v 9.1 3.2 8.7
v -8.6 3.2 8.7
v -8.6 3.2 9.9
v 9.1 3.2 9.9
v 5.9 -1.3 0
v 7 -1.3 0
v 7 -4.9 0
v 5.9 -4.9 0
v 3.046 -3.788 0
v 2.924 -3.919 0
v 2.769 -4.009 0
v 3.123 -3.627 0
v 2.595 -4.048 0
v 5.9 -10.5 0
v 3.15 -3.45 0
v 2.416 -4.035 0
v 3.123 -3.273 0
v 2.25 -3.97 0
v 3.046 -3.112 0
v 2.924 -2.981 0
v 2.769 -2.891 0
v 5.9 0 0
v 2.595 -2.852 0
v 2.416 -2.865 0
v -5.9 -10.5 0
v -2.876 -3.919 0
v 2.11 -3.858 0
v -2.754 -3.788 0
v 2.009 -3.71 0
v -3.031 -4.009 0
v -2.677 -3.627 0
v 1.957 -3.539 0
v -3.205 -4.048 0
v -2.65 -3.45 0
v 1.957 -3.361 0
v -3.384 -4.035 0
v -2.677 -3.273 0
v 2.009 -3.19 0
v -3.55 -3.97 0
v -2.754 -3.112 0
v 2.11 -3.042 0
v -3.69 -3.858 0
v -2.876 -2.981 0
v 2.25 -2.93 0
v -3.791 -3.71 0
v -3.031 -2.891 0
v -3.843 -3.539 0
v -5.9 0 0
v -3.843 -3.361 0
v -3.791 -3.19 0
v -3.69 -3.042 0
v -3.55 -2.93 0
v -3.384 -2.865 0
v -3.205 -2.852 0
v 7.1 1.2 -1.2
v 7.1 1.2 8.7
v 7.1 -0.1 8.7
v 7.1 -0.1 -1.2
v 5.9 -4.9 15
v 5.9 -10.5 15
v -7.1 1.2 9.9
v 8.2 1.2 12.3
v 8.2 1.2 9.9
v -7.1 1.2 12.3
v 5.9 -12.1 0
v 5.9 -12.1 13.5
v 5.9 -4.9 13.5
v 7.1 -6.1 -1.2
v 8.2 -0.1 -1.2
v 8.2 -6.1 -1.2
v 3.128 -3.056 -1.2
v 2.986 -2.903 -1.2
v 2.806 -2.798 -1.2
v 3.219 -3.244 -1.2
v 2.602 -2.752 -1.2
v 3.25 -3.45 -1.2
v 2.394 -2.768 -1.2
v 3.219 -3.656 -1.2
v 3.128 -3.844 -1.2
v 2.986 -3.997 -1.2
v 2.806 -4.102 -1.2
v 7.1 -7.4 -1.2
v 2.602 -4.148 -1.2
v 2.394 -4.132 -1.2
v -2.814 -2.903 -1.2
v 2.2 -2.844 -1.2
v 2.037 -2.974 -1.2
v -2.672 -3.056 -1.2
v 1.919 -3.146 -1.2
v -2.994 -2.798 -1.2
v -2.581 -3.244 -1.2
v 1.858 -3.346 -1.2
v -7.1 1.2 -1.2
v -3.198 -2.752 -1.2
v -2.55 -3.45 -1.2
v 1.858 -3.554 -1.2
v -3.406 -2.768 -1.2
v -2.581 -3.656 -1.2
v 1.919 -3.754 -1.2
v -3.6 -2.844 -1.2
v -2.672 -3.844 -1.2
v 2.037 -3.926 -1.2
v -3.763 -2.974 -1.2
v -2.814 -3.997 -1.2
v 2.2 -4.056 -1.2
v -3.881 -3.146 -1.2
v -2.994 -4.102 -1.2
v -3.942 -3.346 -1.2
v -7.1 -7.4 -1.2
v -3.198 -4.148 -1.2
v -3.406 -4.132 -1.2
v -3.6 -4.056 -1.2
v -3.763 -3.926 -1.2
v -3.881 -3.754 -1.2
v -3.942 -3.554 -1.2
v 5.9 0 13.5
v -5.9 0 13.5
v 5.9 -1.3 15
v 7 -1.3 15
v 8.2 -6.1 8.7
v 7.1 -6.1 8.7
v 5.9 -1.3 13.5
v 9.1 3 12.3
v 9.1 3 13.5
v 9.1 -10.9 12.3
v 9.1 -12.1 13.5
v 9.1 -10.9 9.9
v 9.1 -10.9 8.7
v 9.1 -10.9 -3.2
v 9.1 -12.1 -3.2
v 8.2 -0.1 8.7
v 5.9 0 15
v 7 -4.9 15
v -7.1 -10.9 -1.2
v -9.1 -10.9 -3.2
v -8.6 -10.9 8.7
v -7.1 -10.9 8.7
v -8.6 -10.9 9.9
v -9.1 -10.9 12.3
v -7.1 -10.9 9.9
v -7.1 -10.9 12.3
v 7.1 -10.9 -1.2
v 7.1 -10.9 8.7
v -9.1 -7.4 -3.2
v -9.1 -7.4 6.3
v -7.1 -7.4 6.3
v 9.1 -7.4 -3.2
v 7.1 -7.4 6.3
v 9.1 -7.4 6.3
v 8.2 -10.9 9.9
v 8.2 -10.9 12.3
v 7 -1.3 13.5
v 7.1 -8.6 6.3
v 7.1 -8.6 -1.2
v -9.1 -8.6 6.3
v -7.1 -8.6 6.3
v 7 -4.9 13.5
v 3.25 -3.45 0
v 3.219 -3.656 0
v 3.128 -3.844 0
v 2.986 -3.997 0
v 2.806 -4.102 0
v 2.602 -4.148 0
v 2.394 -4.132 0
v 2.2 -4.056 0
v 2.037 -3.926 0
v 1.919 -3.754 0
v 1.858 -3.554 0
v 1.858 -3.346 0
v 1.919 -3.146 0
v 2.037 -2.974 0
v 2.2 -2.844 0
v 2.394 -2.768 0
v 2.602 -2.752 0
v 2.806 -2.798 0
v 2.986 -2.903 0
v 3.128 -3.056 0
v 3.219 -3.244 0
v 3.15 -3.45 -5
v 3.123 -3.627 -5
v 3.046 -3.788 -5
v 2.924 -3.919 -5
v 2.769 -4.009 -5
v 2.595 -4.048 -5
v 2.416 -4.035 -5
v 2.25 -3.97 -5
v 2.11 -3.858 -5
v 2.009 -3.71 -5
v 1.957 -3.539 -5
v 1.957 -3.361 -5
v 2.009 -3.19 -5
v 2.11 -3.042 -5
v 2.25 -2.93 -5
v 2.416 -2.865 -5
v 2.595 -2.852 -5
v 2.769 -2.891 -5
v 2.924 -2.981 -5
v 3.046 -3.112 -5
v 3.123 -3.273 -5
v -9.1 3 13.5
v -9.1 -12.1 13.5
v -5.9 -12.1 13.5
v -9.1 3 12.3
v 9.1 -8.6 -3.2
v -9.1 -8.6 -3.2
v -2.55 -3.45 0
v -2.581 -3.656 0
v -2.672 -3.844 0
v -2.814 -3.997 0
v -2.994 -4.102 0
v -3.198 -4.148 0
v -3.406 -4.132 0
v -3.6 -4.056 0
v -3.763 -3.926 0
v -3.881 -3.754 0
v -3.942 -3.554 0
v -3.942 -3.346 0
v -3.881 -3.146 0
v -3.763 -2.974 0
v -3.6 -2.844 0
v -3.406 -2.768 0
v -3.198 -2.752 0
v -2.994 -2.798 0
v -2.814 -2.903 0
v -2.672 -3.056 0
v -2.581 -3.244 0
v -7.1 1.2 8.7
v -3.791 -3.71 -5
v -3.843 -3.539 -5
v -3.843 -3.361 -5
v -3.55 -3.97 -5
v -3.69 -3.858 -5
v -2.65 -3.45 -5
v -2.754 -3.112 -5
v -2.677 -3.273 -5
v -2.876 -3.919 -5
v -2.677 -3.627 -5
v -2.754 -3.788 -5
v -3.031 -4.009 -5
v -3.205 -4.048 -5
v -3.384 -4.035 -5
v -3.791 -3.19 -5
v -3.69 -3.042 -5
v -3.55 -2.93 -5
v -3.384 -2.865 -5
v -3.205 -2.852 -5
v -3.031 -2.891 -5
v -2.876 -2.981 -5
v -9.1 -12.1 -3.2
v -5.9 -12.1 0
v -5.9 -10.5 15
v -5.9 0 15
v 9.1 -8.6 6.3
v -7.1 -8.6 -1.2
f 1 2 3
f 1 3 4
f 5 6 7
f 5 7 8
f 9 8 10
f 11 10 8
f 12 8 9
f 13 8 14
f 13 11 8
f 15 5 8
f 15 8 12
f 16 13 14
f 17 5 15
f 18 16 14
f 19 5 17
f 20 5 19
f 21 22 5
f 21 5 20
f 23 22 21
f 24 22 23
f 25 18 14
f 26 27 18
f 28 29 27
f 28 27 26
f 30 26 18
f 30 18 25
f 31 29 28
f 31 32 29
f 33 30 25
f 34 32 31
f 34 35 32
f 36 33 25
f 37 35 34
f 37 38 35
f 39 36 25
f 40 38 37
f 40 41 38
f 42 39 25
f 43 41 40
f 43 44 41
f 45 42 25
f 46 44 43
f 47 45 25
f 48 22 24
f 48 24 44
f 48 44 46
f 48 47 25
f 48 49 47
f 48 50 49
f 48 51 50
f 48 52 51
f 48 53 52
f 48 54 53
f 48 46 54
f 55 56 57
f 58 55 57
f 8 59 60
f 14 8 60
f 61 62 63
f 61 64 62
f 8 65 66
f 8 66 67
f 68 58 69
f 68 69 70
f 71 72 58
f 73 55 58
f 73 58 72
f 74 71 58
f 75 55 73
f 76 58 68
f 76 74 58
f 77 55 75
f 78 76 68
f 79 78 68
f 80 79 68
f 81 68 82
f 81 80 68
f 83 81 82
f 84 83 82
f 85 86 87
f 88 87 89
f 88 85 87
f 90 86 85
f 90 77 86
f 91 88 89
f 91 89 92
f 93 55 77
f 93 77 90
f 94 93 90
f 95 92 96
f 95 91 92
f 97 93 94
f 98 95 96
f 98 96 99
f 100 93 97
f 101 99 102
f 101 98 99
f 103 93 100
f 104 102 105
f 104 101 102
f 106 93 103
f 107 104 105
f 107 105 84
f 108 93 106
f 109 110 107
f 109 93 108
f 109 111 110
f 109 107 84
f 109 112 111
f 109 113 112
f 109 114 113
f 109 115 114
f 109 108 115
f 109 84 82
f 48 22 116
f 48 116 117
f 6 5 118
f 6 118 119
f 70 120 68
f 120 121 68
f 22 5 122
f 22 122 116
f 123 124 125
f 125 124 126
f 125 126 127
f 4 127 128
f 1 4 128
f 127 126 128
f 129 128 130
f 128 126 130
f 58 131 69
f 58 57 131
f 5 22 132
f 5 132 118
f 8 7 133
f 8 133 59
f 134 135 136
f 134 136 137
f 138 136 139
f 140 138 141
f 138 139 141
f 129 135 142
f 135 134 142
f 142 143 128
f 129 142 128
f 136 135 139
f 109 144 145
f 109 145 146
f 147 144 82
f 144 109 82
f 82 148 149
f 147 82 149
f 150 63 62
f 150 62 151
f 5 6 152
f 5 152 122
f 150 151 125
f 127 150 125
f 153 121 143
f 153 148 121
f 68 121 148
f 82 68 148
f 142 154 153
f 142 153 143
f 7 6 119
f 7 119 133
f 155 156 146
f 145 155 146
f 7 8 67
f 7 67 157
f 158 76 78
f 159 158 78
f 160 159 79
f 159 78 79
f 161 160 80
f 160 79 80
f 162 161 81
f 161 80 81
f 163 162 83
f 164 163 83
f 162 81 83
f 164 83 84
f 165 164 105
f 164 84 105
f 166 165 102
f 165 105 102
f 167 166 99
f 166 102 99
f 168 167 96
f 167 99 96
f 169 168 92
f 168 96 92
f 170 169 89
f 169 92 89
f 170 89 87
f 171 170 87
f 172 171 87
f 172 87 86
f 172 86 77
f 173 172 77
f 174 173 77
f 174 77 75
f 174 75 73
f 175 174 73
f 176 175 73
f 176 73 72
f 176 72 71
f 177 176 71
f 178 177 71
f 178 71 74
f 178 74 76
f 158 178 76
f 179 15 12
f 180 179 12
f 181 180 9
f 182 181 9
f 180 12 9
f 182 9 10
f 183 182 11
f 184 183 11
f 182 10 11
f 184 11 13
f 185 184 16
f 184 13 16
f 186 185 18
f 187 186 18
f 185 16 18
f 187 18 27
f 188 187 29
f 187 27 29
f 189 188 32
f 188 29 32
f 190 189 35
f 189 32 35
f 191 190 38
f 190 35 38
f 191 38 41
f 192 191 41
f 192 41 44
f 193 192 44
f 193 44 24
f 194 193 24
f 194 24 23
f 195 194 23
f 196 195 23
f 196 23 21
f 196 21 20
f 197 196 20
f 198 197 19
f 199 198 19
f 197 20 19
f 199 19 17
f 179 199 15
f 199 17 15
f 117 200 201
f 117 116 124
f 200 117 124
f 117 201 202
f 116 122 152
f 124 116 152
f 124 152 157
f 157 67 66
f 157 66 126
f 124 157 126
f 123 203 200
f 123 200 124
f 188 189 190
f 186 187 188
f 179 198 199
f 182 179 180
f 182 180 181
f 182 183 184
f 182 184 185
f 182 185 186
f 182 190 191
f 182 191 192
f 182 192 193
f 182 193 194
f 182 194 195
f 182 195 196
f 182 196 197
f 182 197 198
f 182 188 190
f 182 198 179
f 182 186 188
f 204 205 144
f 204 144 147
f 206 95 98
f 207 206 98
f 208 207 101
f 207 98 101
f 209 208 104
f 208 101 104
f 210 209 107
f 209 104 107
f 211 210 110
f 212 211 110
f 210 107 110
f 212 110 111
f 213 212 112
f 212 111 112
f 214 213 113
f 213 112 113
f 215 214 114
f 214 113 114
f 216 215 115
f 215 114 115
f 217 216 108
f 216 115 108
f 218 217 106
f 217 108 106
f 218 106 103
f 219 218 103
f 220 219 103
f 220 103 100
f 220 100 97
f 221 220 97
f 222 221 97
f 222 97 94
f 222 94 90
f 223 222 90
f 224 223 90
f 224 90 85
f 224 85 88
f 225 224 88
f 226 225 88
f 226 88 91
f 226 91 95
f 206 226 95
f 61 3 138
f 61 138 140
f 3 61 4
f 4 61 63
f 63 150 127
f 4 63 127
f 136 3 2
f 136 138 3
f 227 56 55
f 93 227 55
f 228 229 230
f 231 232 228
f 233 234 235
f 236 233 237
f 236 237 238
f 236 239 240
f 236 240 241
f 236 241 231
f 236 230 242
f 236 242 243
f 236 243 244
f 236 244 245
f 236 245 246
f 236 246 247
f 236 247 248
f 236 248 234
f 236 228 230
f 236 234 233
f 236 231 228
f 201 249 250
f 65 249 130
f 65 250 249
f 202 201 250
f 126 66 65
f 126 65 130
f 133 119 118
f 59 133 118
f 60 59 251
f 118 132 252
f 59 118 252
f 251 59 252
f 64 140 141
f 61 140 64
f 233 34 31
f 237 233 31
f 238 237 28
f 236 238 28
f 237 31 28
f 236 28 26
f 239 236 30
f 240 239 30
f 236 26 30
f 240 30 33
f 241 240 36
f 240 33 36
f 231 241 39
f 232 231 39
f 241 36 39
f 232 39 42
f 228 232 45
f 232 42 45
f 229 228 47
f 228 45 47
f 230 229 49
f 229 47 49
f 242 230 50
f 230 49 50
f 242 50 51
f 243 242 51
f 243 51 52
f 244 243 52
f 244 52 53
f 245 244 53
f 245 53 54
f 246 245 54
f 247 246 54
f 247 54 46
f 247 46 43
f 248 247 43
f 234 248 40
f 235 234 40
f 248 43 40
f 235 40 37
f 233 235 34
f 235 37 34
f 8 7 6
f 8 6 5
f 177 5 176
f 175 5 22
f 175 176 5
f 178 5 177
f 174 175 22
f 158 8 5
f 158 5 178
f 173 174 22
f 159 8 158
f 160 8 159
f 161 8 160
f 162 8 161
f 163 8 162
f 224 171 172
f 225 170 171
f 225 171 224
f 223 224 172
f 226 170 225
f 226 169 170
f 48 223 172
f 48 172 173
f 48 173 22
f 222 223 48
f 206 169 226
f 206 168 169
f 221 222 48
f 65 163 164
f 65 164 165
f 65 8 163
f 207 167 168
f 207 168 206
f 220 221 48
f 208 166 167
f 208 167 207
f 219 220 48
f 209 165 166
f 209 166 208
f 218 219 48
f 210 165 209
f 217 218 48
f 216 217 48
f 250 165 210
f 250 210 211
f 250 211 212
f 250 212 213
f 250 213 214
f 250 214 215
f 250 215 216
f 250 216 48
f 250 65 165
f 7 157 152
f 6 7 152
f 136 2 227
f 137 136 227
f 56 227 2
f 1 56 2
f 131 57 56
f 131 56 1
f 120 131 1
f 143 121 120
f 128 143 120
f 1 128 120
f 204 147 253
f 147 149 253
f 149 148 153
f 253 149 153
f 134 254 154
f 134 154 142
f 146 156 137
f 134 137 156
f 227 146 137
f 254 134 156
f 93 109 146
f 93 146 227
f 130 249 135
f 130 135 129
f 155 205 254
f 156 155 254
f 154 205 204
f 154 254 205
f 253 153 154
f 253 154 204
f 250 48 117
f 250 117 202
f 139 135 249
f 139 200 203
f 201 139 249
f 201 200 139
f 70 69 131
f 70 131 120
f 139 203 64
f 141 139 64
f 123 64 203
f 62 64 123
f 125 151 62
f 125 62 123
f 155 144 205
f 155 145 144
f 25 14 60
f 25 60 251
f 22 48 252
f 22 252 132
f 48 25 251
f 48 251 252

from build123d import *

# Parameters (mm, degrees)
PAD_DEPTH       = 15
SKETCH001_R     = 0.6
PAD001_DEPTH    = 5
SKETCH002_R     = 0.6
PAD002_DEPTH    = 5
PAD003_DEPTH    = 1.2
PAD004_DEPTH    = 13.5
SKETCH005_W     = 1.2
SKETCH005_H     = 14.7
PAD005_DEPTH    = 2
SKETCH006_W     = 1.2
SKETCH006_H     = 14.7
PAD006_DEPTH    = 2
PAD007_DEPTH    = 1.2
SKETCH008_W     = 2
SKETCH008_H     = 12.1
PAD008_DEPTH    = 1.2
SKETCH009_W     = 18.2
SKETCH009_H     = 1.2
PAD009_DEPTH    = 2
SKETCH010_W     = 18.2
SKETCH010_H     = 1.2
PAD010_DEPTH    = 2
SKETCH011_W     = 6
SKETCH011_H     = 1.2
PAD011_DEPTH    = 0.1
SKETCH012_W     = 1.2
SKETCH012_H     = 7.5
PAD012_DEPTH    = 2
SKETCH013_W     = 1.2
SKETCH013_H     = 7.5
PAD013_DEPTH    = 2
SKETCH014_W     = 18.2
SKETCH014_H     = 1.2
PAD014_DEPTH    = 2
SKETCH015_W     = 12.1
SKETCH015_H     = 1.2
PAD015_DEPTH    = 1.5
SKETCH016_W     = 4.8
SKETCH016_H     = 1.2
PAD016_DEPTH    = 2
SKETCH017_W     = 1.3
SKETCH017_H     = 1.2
PAD017_DEPTH    = 2
SKETCH018_W     = 6
SKETCH018_H     = 1.2
PAD018_DEPTH    = 0.9
SKETCH019_W     = 17.7
SKETCH019_H     = 1.2
PAD019_DEPTH    = 2
SKETCH020_R     = 0.6
POCKET_DEPTH    = 5
SKETCH021_R     = 0.6
POCKET001_DEPTH = 5
SKETCH022_W     = 4.8
SKETCH022_H     = 2.4
PAD020_DEPTH    = 1.1
SKETCH023_W     = 1.3
SKETCH023_H     = 2.4
PAD021_DEPTH    = 1.1
SKETCH024_R     = 0.7
POCKET002_DEPTH = 2
SKETCH025_R     = 0.7
POCKET003_DEPTH = 2
SKETCH026_W     = 18.2
SKETCH026_H     = 1.2
POCKET004_DEPTH = 0.2


with BuildPart() as stecker_und_pins:
    # Sketch → Pad (new body)
    with BuildSketch(Plane.XY):
        Polygon((-5.9, 0), (5.9, 0), (5.9, -1.3), (7, -1.3), (7, -4.9), (5.9, -4.9), (5.9, -10.5), (-5.9, -10.5), align=None)
    extrude(amount=PAD_DEPTH)

    # Sketch001 → Pad001 (new body)
    with BuildSketch(Plane(origin=(0, 0, 0), x_dir=(1, 0, 0), z_dir=(0, 0, -1))):
        with Locations((2.55, 3.45)):
            Circle(SKETCH001_R)
    extrude(amount=PAD001_DEPTH)

    # Sketch002 → Pad002 (new body)
    with BuildSketch(Plane(origin=(0, 0, 0), x_dir=(1, 0, 0), z_dir=(0, 0, -1))):
        with Locations((-3.25, 3.45)):
            Circle(SKETCH002_R)
    extrude(amount=PAD002_DEPTH)


with BuildPart() as pocket004:
    # Sketch003 → Pad003 (new body)
    with BuildSketch(Plane(origin=(0, 0, 0), x_dir=(1, 0, 0), z_dir=(0, 0, -1))):
        Polygon((-7.1, -1.2), (-7.1, 12.1), (7.1, 12.1), (7.1, 6.1), (8.1, 6.1), (8.1, 0.1), (7.1, 0.1), (7.1, -1.2), align=None)
    extrude(amount=PAD003_DEPTH)

    # Sketch004 → Pad004 (new body)
    with BuildSketch(Plane.XY):
        Polygon((-7.1, -12.1), (-7.1, 1.2), (7.1, 1.2), (7.1, -0.1), (8.2, -0.1), (8.2, -6.1), (7.1, -6.1), (7.1, -12.1), (5.9, -12.1), (5.9, -4.9), (7, -4.9), (7, -1.3), (5.9, -1.3), (5.9, 0), (-5.9, 0), (-5.9, -12.1), align=None)
    extrude(amount=PAD004_DEPTH)

    # Sketch005 → Pad005 (new body)
    with BuildSketch(Plane(origin=(7.1, 0, 0), x_dir=(0, -1, 0), z_dir=(1, 0, 0))):
        with Locations((11.5, -6.15)):
            Rectangle(SKETCH005_W, SKETCH005_H)
    extrude(amount=PAD005_DEPTH)

    # Sketch006 → Pad006 (new body)
    with BuildSketch(Plane(origin=(-7.1, 0, 0), x_dir=(0, 1, 0), z_dir=(-1, 0, 0))):
        with Locations((-11.5, -6.15)):
            Rectangle(SKETCH006_W, SKETCH006_H)
    extrude(amount=PAD006_DEPTH)

    # Sketch007 → Pad007 (new body)
    with BuildSketch(Plane.XY.offset(13.5)):
        Polygon((7.1, 1.2), (7.1, -0.1), (8.2, -0.1), (8.2, -6.1), (7.1, -6.1), (7.1, -10.9), (9.1, -10.9), (9.1, 1.2), align=None)
    extrude(amount=-PAD007_DEPTH)

    # Sketch008 → Pad008 (new body)
    with BuildSketch(Plane.XY.offset(13.5)):
        with Locations((-8.1, -4.85)):
            Rectangle(SKETCH008_W, SKETCH008_H)
    extrude(amount=-PAD008_DEPTH)

    # Sketch009 → Pad009 (new body)
    with BuildSketch(Plane(origin=(0, 1.2, 0), x_dir=(1, 0, 0), z_dir=(0, 1, 0))):
        with Locations((0, -12.9)):
            Rectangle(SKETCH009_W, SKETCH009_H)
    extrude(amount=PAD009_DEPTH)

    # Sketch010 → Pad010 (new body)
    with BuildSketch(Plane(origin=(0, 0, -1.2), x_dir=(1, 0, 0), z_dir=(0, 0, -1))):
        with Locations((0, 11.5)):
            Rectangle(SKETCH010_W, SKETCH010_H)
    extrude(amount=PAD010_DEPTH)

    # Sketch011 → Pad011 (new body)
    with BuildSketch(Plane(origin=(8.1, 0, 0), x_dir=(0, -1, 0), z_dir=(1, 0, 0))):
        with Locations((3.1, 0.6)):
            Rectangle(SKETCH011_W, SKETCH011_H)
    extrude(amount=PAD011_DEPTH)

    # Sketch012 → Pad012 (new body)
    with BuildSketch(Plane(origin=(7.1, 0, 0), x_dir=(0, -1, 0), z_dir=(1, 0, 0))):
        with Locations((8, -2.55)):
            Rectangle(SKETCH012_W, SKETCH012_H)
    extrude(amount=PAD012_DEPTH)

    # Sketch013 → Pad013 (new body)
    with BuildSketch(Plane(origin=(-7.1, 0, 0), x_dir=(0, 1, 0), z_dir=(-1, 0, 0))):
        with Locations((-8, -2.55)):
            Rectangle(SKETCH013_W, SKETCH013_H)
    extrude(amount=PAD013_DEPTH)

    # Sketch014 → Pad014 (new body)
    with BuildSketch(Plane(origin=(0, 0, -1.2), x_dir=(1, 0, 0), z_dir=(0, 0, -1))):
        with Locations((0, 8)):
            Rectangle(SKETCH014_W, SKETCH014_H)
    extrude(amount=PAD014_DEPTH)

    # Sketch015 → Pad015 (new body)
    with BuildSketch(Plane(origin=(-7.1, 0, 0), x_dir=(0, 1, 0), z_dir=(-1, 0, 0))):
        with Locations((-4.85, -9.3)):
            Rectangle(SKETCH015_W, SKETCH015_H)
    extrude(amount=PAD015_DEPTH)

    # Sketch016 → Pad016 (new body)
    with BuildSketch(Plane(origin=(7.1, 0, 0), x_dir=(0, -1, 0), z_dir=(1, 0, 0))):
        with Locations((8.5, -9.3)):
            Rectangle(SKETCH016_W, SKETCH016_H)
    extrude(amount=PAD016_DEPTH)

    # Sketch017 → Pad017 (new body)
    with BuildSketch(Plane(origin=(7.1, 0, 0), x_dir=(0, -1, 0), z_dir=(1, 0, 0))):
        with Locations((-0.55, -9.3)):
            Rectangle(SKETCH017_W, SKETCH017_H)
    extrude(amount=PAD017_DEPTH)

    # Sketch018 → Pad018 (new body)
    with BuildSketch(Plane(origin=(8.2, 0, 0), x_dir=(0, -1, 0), z_dir=(1, 0, 0))):
        with Locations((3.1, -9.3)):
            Rectangle(SKETCH018_W, SKETCH018_H)
    extrude(amount=PAD018_DEPTH)

    # Sketch019 → Pad019 (new body)
    with BuildSketch(Plane(origin=(0, 1.2, 0), x_dir=(1, 0, 0), z_dir=(0, 1, 0))):
        with Locations((0.25, -9.3)):
            Rectangle(SKETCH019_W, SKETCH019_H)
    extrude(amount=PAD019_DEPTH)

    # Sketch020 → Pocket (cut)
    with BuildSketch(Plane(origin=(0, 0, -1.2), x_dir=(1, 0, 0), z_dir=(0, 0, -1))):
        with Locations((-3.25, 3.45)):
            Circle(SKETCH020_R)
    extrude(amount=-POCKET_DEPTH, mode=Mode.SUBTRACT)

    # Sketch021 → Pocket001 (cut)
    with BuildSketch(Plane(origin=(0, 0, -1.2), x_dir=(1, 0, 0), z_dir=(0, 0, -1))):
        with Locations((2.55, 3.45)):
            Circle(SKETCH021_R)
    extrude(amount=-POCKET001_DEPTH, mode=Mode.SUBTRACT)

    # Sketch022 → Pad020 (new body)
    with BuildSketch(Plane(origin=(7.1, 0, 0), x_dir=(0, -1, 0), z_dir=(1, 0, 0))):
        with Locations((8.5, -11.1)):
            Rectangle(SKETCH022_W, SKETCH022_H)
    extrude(amount=PAD020_DEPTH)

    # Sketch023 → Pad021 (new body)
    with BuildSketch(Plane(origin=(7.1, 0, 0), x_dir=(0, -1, 0), z_dir=(1, 0, 0))):
        with Locations((-0.55, -11.1)):
            Rectangle(SKETCH023_W, SKETCH023_H)
    extrude(amount=PAD021_DEPTH)

    # Sketch024 → Pocket002 (cut)
    with BuildSketch(Plane(origin=(0, 0, -1.2), x_dir=(1, 0, 0), z_dir=(0, 0, -1))):
        with Locations((2.55, 3.45)):
            Circle(SKETCH024_R)
    extrude(amount=-POCKET002_DEPTH, mode=Mode.SUBTRACT)

    # Sketch025 → Pocket003 (cut)
    with BuildSketch(Plane(origin=(0, 0, -1.2), x_dir=(1, 0, 0), z_dir=(0, 0, -1))):
        with Locations((-3.25, 3.45)):
            Circle(SKETCH025_R)
    extrude(amount=-POCKET003_DEPTH, mode=Mode.SUBTRACT)

    # Sketch026 → Pocket004 (cut)
    with BuildSketch(Plane(origin=(0, 3.2, 0), x_dir=(1, 0, 0), z_dir=(0, 1, 0))):
        with Locations((0, -12.9)):
            Rectangle(SKETCH026_W, SKETCH026_H)
    extrude(amount=-POCKET004_DEPTH, mode=Mode.SUBTRACT)


solid = Compound([stecker_und_pins.part, pocket004.part])
